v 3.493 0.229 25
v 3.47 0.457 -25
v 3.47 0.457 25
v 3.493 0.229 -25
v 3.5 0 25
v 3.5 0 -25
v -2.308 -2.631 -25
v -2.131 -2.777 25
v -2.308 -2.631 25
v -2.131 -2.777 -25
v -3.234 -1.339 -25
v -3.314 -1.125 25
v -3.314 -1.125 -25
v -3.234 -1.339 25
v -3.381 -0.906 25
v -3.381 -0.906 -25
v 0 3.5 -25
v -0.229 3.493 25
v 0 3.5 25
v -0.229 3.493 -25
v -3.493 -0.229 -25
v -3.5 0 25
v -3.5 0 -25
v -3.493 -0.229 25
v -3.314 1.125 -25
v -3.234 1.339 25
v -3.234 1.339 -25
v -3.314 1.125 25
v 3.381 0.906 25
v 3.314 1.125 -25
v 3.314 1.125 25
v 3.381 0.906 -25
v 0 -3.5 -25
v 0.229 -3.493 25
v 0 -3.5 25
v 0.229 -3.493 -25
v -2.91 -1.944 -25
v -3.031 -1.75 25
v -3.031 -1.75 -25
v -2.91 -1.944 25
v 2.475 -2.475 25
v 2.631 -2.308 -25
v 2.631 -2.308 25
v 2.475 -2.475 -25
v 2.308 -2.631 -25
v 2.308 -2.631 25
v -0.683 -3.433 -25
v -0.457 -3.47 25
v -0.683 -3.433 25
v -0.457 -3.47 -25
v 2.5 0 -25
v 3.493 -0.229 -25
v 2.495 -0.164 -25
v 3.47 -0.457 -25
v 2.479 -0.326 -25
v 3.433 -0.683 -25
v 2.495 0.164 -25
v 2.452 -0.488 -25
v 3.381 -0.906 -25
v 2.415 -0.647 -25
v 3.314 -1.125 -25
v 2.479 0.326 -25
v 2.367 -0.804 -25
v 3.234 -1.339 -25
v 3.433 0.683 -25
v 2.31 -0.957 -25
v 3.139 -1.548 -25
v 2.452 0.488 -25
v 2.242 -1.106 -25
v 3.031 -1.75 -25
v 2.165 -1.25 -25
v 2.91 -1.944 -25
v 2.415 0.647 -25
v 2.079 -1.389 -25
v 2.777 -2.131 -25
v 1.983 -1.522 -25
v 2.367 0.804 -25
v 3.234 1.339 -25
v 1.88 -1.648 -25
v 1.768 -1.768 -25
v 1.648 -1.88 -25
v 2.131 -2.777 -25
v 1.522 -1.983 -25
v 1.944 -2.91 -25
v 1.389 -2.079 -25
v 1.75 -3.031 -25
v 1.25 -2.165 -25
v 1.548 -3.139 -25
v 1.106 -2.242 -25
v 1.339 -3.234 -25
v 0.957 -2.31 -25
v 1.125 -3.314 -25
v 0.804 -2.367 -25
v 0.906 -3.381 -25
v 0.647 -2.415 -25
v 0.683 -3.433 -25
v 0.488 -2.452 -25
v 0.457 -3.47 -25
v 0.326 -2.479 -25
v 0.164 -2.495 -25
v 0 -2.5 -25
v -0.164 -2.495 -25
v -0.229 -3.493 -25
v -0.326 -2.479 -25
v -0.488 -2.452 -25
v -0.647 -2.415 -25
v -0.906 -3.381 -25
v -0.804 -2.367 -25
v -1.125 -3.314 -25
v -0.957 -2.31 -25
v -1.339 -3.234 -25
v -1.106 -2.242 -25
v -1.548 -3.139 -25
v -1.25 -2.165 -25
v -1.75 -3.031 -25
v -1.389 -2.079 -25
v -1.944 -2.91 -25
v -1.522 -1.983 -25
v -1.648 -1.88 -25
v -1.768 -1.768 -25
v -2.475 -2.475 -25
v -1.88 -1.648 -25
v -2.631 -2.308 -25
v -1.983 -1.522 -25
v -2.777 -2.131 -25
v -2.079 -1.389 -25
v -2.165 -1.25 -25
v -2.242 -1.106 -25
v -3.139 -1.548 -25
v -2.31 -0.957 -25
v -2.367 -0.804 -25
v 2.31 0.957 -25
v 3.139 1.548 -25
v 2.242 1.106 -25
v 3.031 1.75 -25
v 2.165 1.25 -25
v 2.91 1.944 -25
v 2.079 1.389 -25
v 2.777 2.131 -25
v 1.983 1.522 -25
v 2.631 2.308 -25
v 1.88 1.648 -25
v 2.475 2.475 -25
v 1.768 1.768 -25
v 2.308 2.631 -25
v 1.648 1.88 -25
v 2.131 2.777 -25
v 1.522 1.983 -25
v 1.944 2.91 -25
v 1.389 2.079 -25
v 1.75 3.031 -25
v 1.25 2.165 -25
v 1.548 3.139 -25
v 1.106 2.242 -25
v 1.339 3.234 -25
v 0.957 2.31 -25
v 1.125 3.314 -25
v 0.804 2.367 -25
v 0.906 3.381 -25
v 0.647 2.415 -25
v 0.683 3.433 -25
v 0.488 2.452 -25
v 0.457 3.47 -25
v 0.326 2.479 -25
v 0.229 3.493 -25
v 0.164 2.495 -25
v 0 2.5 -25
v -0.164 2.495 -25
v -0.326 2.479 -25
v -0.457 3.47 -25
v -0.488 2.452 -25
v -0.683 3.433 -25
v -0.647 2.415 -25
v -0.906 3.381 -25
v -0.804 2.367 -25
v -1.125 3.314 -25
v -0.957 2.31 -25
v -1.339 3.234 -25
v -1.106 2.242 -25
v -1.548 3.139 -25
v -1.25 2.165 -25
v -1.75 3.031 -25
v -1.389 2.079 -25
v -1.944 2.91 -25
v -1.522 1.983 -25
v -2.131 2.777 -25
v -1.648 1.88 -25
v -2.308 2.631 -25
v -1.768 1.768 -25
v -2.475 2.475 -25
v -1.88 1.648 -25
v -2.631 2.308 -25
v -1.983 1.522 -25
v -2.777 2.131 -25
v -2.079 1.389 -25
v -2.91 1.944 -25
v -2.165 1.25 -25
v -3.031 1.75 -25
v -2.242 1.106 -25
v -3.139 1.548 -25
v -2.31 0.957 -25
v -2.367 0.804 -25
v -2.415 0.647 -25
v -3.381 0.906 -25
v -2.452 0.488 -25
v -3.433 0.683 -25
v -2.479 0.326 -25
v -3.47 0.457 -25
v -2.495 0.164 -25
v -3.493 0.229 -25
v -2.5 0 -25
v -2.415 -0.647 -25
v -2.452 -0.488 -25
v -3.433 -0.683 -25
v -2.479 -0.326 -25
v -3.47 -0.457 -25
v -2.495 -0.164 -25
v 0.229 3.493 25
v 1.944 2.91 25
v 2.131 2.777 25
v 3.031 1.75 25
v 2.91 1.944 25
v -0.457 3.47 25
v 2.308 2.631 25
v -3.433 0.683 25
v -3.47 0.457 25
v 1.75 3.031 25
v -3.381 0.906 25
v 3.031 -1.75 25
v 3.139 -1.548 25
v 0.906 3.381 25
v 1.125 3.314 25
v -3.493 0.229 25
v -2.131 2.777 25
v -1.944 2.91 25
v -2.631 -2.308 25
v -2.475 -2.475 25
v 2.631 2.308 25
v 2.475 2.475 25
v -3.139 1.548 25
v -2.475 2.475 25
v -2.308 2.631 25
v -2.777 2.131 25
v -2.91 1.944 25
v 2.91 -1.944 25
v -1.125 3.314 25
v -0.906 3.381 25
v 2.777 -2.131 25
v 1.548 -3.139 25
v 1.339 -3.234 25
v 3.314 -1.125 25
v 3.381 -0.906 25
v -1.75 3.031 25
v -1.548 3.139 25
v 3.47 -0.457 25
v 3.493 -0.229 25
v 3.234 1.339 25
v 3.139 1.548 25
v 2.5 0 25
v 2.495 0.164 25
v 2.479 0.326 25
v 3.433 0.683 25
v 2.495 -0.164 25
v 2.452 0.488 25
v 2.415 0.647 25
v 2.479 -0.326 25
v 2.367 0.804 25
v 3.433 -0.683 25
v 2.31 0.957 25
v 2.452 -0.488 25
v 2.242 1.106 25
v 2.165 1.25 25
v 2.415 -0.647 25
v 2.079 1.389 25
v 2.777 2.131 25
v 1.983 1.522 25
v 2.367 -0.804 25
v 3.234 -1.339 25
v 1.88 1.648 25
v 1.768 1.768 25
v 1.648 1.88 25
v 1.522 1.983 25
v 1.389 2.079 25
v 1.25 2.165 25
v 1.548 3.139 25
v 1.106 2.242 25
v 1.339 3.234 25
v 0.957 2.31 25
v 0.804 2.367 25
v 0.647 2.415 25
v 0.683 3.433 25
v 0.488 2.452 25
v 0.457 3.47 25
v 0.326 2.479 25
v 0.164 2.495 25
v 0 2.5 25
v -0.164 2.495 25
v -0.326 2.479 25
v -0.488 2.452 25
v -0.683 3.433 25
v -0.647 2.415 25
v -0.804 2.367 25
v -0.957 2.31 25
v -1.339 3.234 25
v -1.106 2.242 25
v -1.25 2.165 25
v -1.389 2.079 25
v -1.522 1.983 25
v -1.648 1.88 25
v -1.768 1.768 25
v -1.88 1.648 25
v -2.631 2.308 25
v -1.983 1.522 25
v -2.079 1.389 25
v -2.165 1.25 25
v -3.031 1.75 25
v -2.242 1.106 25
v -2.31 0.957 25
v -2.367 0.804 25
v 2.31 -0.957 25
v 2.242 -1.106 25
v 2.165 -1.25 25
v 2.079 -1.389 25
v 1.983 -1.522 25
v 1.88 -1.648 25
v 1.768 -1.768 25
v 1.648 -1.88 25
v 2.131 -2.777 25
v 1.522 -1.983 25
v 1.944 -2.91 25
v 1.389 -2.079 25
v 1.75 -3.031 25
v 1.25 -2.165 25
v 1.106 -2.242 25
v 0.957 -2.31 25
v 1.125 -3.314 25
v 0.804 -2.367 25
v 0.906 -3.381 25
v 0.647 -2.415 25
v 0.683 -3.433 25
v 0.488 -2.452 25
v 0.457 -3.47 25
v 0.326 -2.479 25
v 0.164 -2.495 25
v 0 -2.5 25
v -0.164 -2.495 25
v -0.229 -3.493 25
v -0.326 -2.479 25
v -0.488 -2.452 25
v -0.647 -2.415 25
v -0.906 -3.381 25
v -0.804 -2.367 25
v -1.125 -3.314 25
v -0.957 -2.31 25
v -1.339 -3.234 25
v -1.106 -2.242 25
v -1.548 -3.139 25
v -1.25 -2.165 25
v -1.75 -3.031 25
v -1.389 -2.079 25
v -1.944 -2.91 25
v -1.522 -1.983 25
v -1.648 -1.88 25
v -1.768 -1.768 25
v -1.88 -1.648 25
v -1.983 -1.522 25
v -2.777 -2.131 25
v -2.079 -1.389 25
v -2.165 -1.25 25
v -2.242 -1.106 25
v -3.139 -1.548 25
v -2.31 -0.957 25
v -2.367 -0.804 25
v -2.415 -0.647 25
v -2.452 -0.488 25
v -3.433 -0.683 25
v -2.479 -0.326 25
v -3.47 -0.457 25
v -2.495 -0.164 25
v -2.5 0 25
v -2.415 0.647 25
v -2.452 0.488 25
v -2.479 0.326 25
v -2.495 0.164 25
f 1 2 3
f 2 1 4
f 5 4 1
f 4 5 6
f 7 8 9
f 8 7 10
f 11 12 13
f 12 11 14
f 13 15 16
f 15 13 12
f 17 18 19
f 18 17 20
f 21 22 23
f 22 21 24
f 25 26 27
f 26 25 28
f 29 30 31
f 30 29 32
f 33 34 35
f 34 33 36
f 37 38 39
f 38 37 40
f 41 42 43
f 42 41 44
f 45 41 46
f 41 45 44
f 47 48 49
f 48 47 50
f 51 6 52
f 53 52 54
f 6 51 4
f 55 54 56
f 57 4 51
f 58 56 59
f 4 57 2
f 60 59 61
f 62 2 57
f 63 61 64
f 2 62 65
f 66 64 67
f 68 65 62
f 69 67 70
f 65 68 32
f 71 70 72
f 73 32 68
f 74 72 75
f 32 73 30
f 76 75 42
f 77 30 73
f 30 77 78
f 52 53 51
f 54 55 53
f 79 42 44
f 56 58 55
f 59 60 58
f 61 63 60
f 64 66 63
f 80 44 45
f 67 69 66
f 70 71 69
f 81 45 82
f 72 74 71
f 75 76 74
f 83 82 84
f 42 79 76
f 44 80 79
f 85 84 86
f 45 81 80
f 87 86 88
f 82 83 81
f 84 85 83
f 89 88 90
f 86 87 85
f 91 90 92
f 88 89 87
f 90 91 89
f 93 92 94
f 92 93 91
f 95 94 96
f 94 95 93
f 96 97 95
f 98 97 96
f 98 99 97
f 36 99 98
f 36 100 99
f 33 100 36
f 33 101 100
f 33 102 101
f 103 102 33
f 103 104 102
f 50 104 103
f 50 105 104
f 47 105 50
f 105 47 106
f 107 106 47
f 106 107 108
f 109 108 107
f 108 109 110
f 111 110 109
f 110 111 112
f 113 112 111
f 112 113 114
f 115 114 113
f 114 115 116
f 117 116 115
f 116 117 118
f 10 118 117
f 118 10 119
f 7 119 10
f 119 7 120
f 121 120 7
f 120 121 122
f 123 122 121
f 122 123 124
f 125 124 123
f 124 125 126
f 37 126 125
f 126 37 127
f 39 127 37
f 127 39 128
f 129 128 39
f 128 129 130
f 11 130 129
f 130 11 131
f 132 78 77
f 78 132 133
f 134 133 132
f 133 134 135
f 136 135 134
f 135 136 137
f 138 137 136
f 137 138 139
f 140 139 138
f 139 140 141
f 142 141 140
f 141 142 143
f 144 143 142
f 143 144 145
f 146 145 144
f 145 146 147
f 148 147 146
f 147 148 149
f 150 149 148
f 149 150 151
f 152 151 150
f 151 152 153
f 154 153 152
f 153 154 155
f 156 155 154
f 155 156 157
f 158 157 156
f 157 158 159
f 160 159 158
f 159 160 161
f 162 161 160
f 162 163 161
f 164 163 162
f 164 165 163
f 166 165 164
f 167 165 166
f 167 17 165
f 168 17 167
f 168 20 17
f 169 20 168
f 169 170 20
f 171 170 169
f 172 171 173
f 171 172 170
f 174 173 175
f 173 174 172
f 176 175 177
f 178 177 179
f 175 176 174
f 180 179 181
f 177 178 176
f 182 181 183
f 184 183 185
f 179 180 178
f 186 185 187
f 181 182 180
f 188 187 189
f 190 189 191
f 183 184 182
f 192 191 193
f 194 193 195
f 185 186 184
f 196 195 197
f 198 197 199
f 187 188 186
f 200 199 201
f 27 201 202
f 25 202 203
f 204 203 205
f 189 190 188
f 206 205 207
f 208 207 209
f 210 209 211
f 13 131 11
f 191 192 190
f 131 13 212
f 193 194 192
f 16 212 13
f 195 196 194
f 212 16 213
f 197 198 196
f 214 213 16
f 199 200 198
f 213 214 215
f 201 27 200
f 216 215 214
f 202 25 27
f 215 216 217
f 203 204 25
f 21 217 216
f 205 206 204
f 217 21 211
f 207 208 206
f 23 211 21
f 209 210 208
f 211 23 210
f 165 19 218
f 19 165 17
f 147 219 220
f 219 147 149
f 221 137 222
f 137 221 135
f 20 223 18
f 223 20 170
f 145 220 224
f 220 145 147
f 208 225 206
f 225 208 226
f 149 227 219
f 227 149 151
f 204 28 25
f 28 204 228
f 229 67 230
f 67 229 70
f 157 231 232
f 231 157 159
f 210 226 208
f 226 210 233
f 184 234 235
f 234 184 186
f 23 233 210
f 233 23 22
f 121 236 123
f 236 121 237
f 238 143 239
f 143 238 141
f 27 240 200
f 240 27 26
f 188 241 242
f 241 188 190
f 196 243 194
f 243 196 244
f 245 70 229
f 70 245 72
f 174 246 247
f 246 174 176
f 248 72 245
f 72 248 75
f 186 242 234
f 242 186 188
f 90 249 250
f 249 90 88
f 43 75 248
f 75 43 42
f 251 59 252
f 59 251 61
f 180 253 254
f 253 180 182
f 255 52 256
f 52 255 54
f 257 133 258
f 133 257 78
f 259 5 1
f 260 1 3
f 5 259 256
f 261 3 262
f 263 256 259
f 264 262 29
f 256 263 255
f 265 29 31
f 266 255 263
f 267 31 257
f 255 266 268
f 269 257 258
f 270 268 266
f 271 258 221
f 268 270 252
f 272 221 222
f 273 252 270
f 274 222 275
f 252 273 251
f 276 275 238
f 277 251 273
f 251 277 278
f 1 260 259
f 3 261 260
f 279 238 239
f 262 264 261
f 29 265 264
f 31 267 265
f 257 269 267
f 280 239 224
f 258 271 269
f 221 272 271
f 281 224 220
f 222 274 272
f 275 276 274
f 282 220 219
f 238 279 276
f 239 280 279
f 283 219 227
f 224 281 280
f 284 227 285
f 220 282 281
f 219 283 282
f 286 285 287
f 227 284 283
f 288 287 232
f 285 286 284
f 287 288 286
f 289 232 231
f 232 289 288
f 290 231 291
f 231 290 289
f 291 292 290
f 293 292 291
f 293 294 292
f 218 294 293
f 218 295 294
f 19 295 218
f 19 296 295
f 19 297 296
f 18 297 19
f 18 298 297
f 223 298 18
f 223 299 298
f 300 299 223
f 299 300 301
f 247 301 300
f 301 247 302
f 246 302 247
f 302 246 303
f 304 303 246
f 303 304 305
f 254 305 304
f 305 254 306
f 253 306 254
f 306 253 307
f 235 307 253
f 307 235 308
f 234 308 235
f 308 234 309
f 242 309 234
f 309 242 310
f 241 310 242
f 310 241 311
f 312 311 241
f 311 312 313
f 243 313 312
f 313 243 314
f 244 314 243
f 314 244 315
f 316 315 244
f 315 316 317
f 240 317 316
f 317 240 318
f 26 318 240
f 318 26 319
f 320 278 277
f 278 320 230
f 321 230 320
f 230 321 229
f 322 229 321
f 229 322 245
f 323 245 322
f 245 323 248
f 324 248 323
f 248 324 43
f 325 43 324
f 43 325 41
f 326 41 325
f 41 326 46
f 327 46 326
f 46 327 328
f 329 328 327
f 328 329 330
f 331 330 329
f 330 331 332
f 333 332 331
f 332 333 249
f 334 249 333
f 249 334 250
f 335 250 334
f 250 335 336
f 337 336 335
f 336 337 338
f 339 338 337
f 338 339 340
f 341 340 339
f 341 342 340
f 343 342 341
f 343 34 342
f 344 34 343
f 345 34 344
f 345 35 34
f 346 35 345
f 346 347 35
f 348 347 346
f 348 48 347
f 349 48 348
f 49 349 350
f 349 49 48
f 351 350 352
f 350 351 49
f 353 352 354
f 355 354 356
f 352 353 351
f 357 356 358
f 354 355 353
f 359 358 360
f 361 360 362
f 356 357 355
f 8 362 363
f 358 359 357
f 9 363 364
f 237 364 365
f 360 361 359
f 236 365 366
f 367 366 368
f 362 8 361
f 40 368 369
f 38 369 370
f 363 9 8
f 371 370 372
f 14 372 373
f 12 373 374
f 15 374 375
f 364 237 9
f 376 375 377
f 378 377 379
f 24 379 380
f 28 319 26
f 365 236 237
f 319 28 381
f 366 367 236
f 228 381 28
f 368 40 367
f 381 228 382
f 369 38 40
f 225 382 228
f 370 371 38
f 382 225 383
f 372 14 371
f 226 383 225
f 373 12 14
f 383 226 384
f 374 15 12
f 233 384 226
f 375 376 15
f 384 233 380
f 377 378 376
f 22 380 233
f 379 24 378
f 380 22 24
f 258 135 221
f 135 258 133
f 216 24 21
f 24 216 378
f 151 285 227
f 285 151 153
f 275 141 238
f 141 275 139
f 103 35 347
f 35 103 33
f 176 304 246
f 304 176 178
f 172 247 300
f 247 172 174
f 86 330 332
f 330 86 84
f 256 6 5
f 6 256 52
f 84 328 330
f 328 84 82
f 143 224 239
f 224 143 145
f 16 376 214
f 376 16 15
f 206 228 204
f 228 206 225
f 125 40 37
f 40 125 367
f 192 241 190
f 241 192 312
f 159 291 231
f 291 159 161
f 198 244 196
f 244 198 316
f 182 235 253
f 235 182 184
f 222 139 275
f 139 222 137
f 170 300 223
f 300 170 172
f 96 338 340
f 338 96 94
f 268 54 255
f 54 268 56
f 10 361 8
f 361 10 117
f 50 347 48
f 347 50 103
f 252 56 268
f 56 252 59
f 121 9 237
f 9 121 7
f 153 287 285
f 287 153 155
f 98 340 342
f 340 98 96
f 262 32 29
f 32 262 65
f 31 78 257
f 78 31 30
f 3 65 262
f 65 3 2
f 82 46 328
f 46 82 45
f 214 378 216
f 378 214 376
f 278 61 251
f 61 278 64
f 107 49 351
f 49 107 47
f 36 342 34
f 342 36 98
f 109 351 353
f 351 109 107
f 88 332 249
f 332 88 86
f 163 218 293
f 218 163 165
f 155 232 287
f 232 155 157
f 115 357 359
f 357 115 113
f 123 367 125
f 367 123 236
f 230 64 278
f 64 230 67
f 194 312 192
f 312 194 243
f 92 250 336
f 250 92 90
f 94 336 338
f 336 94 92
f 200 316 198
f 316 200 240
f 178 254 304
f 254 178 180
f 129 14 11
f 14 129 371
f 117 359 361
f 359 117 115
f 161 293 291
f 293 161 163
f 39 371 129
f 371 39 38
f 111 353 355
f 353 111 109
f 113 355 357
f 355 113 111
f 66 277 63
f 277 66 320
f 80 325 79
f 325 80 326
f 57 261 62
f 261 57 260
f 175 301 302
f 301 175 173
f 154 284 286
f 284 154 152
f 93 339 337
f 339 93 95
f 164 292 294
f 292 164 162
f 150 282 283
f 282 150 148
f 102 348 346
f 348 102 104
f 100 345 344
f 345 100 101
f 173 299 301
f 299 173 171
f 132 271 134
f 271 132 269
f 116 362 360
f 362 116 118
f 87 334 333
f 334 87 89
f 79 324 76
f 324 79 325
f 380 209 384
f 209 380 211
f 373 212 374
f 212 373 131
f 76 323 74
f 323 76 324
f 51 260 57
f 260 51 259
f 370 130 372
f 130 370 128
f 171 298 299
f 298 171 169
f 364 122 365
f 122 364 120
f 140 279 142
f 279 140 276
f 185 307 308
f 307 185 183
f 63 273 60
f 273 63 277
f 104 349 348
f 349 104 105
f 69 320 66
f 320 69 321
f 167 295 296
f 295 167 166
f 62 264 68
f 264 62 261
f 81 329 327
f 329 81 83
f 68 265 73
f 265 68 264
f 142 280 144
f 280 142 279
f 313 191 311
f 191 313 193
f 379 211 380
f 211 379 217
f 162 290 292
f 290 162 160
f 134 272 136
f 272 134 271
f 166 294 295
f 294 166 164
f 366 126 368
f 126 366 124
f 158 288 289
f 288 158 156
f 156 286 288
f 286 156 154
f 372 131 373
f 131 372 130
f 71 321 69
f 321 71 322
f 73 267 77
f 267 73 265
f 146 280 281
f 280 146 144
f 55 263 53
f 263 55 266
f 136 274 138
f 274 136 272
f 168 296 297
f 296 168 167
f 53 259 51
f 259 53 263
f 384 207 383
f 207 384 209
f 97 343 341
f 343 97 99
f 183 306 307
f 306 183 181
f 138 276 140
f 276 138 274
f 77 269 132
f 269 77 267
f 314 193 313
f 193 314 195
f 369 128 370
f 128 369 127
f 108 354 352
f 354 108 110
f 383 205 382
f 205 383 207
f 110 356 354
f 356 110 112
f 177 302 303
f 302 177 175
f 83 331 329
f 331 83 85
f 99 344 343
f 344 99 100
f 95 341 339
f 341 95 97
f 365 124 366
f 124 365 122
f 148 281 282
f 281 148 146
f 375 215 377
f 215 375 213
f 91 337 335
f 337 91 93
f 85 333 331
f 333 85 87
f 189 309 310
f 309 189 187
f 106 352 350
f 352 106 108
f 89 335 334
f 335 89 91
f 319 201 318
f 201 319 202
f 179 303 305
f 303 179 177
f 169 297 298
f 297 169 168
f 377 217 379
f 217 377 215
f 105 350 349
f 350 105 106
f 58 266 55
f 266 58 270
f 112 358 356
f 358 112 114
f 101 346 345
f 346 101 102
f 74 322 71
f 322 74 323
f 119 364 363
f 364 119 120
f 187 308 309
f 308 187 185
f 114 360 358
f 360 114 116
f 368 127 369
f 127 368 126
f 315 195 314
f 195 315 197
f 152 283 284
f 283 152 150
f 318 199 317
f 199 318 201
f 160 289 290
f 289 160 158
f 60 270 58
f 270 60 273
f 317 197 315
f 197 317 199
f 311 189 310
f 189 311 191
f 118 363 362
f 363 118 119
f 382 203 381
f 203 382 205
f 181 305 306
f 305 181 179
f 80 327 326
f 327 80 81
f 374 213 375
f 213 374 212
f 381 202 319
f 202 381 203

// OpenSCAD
// Heatshrink sleeving (hollow tube)

// Parameters
inner_diameter = 5;   // ID
outer_diameter = 7;   // OD
length         = 50;  // tube length
centered       = true;

// Quality
$fn = 96;

// Small overlap to ensure robust boolean and visible bore
eps = 0.02;

module heatshrink_sleeving(id, od, len, center=true) {
    // Guard against invalid dimensions
    wall_ok = (od > id) && (id > 0) && (len > 0);

    if (wall_ok) {
        difference() {
            cylinder(h=len, r=od/2, center=center);
            // Extend inner cutter slightly so the bore is guaranteed open
            cylinder(h=len + 2*eps, r=id/2, center=center);
        }
    }
}

// Main
heatshrink_sleeving(inner_diameter, outer_diameter, length, centered);
